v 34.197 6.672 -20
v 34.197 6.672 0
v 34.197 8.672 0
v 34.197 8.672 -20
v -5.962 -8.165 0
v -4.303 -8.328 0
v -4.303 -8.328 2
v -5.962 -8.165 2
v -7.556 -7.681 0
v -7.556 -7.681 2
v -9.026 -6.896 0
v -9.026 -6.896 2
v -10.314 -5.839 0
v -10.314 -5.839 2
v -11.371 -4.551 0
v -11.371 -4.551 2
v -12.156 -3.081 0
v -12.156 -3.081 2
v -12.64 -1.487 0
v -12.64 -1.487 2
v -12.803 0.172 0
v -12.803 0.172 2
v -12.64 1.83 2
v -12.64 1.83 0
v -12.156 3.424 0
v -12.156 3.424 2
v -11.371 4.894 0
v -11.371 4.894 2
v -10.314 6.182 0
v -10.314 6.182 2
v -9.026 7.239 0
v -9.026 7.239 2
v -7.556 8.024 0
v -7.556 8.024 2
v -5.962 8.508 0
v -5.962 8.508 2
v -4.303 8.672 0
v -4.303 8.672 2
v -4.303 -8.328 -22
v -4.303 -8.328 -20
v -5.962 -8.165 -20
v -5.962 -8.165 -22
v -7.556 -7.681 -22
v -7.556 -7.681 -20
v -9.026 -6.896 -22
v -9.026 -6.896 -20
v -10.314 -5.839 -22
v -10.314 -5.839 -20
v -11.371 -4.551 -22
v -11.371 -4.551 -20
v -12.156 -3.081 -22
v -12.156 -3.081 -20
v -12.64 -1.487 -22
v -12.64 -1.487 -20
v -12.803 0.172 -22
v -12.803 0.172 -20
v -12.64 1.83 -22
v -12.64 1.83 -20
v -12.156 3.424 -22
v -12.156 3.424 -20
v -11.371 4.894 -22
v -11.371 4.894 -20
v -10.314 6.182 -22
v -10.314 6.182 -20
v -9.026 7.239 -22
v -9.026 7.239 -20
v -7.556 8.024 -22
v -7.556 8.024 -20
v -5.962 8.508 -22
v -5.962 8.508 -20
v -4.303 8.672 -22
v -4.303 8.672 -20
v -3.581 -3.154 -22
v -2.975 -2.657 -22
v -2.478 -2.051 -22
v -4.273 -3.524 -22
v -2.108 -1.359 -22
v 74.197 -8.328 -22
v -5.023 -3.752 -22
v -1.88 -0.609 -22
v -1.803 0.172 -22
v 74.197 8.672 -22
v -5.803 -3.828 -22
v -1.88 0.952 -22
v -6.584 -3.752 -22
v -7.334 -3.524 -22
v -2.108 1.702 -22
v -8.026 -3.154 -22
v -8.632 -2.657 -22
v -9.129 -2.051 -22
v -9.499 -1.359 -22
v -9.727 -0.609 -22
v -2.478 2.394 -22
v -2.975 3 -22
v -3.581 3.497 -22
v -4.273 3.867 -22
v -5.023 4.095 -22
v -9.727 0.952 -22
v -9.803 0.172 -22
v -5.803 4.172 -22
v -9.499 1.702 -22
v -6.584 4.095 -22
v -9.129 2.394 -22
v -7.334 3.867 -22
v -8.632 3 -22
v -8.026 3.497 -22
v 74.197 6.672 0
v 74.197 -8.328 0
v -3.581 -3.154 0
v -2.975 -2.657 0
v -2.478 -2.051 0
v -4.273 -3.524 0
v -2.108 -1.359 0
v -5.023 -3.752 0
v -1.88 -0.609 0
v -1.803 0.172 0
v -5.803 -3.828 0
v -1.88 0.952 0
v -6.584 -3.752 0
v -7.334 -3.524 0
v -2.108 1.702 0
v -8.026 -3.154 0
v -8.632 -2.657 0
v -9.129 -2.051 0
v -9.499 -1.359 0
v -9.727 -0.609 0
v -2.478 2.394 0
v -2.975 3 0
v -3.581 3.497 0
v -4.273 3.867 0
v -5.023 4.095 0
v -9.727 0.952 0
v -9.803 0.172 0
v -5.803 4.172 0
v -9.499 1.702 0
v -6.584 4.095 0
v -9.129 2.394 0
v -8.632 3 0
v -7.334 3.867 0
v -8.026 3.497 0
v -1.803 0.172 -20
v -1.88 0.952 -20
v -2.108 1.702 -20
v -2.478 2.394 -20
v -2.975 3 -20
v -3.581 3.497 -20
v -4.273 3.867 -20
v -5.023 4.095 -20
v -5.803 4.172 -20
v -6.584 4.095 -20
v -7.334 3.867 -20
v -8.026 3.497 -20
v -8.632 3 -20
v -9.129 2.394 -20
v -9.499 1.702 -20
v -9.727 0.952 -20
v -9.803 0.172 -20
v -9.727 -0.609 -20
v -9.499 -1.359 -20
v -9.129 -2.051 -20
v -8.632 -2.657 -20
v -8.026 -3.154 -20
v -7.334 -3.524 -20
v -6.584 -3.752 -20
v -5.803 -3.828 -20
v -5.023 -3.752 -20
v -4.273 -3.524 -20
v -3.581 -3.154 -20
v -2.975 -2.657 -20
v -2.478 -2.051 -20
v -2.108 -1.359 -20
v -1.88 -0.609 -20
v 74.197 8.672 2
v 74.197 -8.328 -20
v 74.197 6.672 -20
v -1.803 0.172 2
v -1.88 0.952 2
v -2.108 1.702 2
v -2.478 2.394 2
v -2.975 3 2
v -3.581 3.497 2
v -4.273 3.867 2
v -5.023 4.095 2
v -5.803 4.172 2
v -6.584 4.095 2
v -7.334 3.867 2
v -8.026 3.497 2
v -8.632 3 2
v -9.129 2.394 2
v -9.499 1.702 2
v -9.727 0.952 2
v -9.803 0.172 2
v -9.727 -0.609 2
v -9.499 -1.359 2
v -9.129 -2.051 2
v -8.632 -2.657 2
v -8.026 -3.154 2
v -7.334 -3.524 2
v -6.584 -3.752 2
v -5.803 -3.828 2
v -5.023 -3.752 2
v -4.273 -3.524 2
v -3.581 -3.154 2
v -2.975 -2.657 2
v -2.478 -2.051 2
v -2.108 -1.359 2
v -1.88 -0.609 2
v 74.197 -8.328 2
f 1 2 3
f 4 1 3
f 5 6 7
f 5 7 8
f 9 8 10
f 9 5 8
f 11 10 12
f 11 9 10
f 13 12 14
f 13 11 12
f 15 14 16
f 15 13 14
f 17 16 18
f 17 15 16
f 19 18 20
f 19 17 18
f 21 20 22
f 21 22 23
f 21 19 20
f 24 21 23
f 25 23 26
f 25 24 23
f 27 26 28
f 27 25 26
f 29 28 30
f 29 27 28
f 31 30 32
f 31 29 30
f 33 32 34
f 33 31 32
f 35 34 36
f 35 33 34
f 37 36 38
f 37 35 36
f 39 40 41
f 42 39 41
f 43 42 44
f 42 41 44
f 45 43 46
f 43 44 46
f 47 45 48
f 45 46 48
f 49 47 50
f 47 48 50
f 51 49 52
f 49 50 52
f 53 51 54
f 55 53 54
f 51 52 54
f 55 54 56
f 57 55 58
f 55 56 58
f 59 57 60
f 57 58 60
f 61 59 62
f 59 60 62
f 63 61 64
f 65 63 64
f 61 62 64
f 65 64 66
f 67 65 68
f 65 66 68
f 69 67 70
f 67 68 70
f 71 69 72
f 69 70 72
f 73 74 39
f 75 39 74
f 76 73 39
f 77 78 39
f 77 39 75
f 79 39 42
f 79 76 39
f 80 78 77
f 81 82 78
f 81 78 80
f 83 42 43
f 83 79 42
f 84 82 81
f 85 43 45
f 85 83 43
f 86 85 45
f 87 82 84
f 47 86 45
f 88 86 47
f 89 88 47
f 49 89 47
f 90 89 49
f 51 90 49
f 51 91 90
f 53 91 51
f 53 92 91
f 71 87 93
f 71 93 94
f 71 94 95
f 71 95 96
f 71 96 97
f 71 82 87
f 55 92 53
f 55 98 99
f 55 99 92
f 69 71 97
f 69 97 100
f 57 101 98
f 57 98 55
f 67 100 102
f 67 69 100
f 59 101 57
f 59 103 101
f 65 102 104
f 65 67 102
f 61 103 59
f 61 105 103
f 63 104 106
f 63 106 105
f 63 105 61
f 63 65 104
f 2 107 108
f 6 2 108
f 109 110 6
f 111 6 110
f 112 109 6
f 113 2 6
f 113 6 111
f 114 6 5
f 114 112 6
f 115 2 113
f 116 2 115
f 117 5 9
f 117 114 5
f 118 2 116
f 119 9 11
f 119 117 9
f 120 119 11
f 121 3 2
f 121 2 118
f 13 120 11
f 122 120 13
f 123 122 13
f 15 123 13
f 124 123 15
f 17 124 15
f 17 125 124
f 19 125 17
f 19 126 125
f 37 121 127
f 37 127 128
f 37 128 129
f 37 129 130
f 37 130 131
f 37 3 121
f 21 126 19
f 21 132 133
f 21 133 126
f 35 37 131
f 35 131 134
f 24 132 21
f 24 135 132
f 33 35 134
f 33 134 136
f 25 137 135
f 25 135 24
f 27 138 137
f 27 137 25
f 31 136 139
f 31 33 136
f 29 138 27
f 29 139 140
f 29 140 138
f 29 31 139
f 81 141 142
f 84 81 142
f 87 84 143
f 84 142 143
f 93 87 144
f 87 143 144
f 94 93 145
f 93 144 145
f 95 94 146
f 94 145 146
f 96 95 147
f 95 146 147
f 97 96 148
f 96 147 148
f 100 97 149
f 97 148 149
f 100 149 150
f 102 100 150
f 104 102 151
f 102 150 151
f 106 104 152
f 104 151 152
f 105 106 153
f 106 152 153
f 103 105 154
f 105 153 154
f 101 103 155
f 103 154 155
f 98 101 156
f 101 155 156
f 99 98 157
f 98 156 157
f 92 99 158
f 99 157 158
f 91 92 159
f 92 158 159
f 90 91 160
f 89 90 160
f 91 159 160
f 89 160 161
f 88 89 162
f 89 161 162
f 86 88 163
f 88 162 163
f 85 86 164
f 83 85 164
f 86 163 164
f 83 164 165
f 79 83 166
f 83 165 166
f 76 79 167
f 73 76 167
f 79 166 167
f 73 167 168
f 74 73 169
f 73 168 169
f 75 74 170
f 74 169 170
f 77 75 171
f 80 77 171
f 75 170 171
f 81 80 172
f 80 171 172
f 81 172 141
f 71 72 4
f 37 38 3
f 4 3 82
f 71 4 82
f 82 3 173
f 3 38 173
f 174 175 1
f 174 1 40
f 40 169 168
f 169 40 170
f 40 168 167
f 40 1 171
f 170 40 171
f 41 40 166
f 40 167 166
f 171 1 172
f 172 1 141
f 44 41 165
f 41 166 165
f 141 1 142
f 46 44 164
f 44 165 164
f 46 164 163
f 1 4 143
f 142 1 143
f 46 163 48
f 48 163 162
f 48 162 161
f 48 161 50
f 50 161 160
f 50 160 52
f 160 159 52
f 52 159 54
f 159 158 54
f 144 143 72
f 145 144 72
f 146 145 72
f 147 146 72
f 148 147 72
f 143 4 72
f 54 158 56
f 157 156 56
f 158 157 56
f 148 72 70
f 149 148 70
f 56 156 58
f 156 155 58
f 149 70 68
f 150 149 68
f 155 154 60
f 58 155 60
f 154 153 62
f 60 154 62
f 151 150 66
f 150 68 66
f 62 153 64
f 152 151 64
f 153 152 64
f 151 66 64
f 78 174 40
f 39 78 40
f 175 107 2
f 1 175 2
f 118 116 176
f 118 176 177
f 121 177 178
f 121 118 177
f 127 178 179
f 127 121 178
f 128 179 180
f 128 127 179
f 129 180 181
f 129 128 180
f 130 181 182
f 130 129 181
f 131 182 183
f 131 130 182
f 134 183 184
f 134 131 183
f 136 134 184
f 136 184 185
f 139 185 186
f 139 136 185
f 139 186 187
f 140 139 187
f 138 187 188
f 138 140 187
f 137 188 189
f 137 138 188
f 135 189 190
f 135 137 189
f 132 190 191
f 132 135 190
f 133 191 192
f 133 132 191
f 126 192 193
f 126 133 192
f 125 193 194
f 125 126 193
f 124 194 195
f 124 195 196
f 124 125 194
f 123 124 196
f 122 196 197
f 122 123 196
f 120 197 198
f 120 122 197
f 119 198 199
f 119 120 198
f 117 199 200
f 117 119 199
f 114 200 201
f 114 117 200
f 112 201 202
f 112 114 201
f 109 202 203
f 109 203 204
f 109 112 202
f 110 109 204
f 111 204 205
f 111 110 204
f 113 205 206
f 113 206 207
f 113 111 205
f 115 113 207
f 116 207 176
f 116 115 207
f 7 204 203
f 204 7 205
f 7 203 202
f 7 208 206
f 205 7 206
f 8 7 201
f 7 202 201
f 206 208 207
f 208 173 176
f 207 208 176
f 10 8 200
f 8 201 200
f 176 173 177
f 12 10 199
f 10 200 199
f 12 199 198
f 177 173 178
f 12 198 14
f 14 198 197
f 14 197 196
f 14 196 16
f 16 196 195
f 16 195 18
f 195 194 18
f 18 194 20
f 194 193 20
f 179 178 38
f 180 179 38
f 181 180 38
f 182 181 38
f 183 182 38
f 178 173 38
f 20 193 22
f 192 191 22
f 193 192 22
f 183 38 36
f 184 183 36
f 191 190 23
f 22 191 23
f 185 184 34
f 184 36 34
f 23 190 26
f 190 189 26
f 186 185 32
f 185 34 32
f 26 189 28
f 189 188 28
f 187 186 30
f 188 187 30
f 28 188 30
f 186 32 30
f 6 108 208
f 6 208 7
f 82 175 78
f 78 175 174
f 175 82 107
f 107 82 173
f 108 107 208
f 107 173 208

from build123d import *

# Parameters (mm, degrees)
SKETCH_1_R      = 4
EXTRUDE_1_DEPTH = 2
SKETCH_2_W      = 40
SKETCH_2_H      = 2
EXTRUDE_2_DEPTH = 20


with BuildPart() as part:
    # 草图1 → 凸台-拉伸1 (new body)
    with BuildSketch(Plane.XY):
        with BuildLine():
            Line((-4.303483184, 8.671520648), (4.196516816, 8.671520648))
            Line((4.196516816, 8.671520648), (74.196516816, 8.671520648))
            Line((74.196516816, 8.671520648), (74.196516816, -8.328479352))
            Line((74.196516816, -8.328479352), (-4.303483184, -8.328479352))
            ThreePointArc((-4.303483184, -8.328479352), (-12.803483184, 0.171520648), (-4.303483184, 8.671520648))
        make_face()
        with Locations((-5.803483184, 0.171520648)):
            Circle(SKETCH_1_R, mode=Mode.SUBTRACT)
    extrude_1 = extrude(amount=EXTRUDE_1_DEPTH)

    # 草图2 → 凸台-拉伸2 (add)
    with BuildSketch(Plane(origin=(0, 0, 0), x_dir=(-1, 0, 0), z_dir=(0, 0, -1))):
        with Locations((-54.196516816, 7.671520648)):
            Rectangle(SKETCH_2_W, SKETCH_2_H)
    extrude(amount=EXTRUDE_2_DEPTH)

    # 镜向1: 凸台-拉伸1 across plane
    add(extrude_1.mirror(Plane(origin=(0, 0, -10), x_dir=(1, 0, 0), z_dir=(0, 0, -1))))


solid = part.part
